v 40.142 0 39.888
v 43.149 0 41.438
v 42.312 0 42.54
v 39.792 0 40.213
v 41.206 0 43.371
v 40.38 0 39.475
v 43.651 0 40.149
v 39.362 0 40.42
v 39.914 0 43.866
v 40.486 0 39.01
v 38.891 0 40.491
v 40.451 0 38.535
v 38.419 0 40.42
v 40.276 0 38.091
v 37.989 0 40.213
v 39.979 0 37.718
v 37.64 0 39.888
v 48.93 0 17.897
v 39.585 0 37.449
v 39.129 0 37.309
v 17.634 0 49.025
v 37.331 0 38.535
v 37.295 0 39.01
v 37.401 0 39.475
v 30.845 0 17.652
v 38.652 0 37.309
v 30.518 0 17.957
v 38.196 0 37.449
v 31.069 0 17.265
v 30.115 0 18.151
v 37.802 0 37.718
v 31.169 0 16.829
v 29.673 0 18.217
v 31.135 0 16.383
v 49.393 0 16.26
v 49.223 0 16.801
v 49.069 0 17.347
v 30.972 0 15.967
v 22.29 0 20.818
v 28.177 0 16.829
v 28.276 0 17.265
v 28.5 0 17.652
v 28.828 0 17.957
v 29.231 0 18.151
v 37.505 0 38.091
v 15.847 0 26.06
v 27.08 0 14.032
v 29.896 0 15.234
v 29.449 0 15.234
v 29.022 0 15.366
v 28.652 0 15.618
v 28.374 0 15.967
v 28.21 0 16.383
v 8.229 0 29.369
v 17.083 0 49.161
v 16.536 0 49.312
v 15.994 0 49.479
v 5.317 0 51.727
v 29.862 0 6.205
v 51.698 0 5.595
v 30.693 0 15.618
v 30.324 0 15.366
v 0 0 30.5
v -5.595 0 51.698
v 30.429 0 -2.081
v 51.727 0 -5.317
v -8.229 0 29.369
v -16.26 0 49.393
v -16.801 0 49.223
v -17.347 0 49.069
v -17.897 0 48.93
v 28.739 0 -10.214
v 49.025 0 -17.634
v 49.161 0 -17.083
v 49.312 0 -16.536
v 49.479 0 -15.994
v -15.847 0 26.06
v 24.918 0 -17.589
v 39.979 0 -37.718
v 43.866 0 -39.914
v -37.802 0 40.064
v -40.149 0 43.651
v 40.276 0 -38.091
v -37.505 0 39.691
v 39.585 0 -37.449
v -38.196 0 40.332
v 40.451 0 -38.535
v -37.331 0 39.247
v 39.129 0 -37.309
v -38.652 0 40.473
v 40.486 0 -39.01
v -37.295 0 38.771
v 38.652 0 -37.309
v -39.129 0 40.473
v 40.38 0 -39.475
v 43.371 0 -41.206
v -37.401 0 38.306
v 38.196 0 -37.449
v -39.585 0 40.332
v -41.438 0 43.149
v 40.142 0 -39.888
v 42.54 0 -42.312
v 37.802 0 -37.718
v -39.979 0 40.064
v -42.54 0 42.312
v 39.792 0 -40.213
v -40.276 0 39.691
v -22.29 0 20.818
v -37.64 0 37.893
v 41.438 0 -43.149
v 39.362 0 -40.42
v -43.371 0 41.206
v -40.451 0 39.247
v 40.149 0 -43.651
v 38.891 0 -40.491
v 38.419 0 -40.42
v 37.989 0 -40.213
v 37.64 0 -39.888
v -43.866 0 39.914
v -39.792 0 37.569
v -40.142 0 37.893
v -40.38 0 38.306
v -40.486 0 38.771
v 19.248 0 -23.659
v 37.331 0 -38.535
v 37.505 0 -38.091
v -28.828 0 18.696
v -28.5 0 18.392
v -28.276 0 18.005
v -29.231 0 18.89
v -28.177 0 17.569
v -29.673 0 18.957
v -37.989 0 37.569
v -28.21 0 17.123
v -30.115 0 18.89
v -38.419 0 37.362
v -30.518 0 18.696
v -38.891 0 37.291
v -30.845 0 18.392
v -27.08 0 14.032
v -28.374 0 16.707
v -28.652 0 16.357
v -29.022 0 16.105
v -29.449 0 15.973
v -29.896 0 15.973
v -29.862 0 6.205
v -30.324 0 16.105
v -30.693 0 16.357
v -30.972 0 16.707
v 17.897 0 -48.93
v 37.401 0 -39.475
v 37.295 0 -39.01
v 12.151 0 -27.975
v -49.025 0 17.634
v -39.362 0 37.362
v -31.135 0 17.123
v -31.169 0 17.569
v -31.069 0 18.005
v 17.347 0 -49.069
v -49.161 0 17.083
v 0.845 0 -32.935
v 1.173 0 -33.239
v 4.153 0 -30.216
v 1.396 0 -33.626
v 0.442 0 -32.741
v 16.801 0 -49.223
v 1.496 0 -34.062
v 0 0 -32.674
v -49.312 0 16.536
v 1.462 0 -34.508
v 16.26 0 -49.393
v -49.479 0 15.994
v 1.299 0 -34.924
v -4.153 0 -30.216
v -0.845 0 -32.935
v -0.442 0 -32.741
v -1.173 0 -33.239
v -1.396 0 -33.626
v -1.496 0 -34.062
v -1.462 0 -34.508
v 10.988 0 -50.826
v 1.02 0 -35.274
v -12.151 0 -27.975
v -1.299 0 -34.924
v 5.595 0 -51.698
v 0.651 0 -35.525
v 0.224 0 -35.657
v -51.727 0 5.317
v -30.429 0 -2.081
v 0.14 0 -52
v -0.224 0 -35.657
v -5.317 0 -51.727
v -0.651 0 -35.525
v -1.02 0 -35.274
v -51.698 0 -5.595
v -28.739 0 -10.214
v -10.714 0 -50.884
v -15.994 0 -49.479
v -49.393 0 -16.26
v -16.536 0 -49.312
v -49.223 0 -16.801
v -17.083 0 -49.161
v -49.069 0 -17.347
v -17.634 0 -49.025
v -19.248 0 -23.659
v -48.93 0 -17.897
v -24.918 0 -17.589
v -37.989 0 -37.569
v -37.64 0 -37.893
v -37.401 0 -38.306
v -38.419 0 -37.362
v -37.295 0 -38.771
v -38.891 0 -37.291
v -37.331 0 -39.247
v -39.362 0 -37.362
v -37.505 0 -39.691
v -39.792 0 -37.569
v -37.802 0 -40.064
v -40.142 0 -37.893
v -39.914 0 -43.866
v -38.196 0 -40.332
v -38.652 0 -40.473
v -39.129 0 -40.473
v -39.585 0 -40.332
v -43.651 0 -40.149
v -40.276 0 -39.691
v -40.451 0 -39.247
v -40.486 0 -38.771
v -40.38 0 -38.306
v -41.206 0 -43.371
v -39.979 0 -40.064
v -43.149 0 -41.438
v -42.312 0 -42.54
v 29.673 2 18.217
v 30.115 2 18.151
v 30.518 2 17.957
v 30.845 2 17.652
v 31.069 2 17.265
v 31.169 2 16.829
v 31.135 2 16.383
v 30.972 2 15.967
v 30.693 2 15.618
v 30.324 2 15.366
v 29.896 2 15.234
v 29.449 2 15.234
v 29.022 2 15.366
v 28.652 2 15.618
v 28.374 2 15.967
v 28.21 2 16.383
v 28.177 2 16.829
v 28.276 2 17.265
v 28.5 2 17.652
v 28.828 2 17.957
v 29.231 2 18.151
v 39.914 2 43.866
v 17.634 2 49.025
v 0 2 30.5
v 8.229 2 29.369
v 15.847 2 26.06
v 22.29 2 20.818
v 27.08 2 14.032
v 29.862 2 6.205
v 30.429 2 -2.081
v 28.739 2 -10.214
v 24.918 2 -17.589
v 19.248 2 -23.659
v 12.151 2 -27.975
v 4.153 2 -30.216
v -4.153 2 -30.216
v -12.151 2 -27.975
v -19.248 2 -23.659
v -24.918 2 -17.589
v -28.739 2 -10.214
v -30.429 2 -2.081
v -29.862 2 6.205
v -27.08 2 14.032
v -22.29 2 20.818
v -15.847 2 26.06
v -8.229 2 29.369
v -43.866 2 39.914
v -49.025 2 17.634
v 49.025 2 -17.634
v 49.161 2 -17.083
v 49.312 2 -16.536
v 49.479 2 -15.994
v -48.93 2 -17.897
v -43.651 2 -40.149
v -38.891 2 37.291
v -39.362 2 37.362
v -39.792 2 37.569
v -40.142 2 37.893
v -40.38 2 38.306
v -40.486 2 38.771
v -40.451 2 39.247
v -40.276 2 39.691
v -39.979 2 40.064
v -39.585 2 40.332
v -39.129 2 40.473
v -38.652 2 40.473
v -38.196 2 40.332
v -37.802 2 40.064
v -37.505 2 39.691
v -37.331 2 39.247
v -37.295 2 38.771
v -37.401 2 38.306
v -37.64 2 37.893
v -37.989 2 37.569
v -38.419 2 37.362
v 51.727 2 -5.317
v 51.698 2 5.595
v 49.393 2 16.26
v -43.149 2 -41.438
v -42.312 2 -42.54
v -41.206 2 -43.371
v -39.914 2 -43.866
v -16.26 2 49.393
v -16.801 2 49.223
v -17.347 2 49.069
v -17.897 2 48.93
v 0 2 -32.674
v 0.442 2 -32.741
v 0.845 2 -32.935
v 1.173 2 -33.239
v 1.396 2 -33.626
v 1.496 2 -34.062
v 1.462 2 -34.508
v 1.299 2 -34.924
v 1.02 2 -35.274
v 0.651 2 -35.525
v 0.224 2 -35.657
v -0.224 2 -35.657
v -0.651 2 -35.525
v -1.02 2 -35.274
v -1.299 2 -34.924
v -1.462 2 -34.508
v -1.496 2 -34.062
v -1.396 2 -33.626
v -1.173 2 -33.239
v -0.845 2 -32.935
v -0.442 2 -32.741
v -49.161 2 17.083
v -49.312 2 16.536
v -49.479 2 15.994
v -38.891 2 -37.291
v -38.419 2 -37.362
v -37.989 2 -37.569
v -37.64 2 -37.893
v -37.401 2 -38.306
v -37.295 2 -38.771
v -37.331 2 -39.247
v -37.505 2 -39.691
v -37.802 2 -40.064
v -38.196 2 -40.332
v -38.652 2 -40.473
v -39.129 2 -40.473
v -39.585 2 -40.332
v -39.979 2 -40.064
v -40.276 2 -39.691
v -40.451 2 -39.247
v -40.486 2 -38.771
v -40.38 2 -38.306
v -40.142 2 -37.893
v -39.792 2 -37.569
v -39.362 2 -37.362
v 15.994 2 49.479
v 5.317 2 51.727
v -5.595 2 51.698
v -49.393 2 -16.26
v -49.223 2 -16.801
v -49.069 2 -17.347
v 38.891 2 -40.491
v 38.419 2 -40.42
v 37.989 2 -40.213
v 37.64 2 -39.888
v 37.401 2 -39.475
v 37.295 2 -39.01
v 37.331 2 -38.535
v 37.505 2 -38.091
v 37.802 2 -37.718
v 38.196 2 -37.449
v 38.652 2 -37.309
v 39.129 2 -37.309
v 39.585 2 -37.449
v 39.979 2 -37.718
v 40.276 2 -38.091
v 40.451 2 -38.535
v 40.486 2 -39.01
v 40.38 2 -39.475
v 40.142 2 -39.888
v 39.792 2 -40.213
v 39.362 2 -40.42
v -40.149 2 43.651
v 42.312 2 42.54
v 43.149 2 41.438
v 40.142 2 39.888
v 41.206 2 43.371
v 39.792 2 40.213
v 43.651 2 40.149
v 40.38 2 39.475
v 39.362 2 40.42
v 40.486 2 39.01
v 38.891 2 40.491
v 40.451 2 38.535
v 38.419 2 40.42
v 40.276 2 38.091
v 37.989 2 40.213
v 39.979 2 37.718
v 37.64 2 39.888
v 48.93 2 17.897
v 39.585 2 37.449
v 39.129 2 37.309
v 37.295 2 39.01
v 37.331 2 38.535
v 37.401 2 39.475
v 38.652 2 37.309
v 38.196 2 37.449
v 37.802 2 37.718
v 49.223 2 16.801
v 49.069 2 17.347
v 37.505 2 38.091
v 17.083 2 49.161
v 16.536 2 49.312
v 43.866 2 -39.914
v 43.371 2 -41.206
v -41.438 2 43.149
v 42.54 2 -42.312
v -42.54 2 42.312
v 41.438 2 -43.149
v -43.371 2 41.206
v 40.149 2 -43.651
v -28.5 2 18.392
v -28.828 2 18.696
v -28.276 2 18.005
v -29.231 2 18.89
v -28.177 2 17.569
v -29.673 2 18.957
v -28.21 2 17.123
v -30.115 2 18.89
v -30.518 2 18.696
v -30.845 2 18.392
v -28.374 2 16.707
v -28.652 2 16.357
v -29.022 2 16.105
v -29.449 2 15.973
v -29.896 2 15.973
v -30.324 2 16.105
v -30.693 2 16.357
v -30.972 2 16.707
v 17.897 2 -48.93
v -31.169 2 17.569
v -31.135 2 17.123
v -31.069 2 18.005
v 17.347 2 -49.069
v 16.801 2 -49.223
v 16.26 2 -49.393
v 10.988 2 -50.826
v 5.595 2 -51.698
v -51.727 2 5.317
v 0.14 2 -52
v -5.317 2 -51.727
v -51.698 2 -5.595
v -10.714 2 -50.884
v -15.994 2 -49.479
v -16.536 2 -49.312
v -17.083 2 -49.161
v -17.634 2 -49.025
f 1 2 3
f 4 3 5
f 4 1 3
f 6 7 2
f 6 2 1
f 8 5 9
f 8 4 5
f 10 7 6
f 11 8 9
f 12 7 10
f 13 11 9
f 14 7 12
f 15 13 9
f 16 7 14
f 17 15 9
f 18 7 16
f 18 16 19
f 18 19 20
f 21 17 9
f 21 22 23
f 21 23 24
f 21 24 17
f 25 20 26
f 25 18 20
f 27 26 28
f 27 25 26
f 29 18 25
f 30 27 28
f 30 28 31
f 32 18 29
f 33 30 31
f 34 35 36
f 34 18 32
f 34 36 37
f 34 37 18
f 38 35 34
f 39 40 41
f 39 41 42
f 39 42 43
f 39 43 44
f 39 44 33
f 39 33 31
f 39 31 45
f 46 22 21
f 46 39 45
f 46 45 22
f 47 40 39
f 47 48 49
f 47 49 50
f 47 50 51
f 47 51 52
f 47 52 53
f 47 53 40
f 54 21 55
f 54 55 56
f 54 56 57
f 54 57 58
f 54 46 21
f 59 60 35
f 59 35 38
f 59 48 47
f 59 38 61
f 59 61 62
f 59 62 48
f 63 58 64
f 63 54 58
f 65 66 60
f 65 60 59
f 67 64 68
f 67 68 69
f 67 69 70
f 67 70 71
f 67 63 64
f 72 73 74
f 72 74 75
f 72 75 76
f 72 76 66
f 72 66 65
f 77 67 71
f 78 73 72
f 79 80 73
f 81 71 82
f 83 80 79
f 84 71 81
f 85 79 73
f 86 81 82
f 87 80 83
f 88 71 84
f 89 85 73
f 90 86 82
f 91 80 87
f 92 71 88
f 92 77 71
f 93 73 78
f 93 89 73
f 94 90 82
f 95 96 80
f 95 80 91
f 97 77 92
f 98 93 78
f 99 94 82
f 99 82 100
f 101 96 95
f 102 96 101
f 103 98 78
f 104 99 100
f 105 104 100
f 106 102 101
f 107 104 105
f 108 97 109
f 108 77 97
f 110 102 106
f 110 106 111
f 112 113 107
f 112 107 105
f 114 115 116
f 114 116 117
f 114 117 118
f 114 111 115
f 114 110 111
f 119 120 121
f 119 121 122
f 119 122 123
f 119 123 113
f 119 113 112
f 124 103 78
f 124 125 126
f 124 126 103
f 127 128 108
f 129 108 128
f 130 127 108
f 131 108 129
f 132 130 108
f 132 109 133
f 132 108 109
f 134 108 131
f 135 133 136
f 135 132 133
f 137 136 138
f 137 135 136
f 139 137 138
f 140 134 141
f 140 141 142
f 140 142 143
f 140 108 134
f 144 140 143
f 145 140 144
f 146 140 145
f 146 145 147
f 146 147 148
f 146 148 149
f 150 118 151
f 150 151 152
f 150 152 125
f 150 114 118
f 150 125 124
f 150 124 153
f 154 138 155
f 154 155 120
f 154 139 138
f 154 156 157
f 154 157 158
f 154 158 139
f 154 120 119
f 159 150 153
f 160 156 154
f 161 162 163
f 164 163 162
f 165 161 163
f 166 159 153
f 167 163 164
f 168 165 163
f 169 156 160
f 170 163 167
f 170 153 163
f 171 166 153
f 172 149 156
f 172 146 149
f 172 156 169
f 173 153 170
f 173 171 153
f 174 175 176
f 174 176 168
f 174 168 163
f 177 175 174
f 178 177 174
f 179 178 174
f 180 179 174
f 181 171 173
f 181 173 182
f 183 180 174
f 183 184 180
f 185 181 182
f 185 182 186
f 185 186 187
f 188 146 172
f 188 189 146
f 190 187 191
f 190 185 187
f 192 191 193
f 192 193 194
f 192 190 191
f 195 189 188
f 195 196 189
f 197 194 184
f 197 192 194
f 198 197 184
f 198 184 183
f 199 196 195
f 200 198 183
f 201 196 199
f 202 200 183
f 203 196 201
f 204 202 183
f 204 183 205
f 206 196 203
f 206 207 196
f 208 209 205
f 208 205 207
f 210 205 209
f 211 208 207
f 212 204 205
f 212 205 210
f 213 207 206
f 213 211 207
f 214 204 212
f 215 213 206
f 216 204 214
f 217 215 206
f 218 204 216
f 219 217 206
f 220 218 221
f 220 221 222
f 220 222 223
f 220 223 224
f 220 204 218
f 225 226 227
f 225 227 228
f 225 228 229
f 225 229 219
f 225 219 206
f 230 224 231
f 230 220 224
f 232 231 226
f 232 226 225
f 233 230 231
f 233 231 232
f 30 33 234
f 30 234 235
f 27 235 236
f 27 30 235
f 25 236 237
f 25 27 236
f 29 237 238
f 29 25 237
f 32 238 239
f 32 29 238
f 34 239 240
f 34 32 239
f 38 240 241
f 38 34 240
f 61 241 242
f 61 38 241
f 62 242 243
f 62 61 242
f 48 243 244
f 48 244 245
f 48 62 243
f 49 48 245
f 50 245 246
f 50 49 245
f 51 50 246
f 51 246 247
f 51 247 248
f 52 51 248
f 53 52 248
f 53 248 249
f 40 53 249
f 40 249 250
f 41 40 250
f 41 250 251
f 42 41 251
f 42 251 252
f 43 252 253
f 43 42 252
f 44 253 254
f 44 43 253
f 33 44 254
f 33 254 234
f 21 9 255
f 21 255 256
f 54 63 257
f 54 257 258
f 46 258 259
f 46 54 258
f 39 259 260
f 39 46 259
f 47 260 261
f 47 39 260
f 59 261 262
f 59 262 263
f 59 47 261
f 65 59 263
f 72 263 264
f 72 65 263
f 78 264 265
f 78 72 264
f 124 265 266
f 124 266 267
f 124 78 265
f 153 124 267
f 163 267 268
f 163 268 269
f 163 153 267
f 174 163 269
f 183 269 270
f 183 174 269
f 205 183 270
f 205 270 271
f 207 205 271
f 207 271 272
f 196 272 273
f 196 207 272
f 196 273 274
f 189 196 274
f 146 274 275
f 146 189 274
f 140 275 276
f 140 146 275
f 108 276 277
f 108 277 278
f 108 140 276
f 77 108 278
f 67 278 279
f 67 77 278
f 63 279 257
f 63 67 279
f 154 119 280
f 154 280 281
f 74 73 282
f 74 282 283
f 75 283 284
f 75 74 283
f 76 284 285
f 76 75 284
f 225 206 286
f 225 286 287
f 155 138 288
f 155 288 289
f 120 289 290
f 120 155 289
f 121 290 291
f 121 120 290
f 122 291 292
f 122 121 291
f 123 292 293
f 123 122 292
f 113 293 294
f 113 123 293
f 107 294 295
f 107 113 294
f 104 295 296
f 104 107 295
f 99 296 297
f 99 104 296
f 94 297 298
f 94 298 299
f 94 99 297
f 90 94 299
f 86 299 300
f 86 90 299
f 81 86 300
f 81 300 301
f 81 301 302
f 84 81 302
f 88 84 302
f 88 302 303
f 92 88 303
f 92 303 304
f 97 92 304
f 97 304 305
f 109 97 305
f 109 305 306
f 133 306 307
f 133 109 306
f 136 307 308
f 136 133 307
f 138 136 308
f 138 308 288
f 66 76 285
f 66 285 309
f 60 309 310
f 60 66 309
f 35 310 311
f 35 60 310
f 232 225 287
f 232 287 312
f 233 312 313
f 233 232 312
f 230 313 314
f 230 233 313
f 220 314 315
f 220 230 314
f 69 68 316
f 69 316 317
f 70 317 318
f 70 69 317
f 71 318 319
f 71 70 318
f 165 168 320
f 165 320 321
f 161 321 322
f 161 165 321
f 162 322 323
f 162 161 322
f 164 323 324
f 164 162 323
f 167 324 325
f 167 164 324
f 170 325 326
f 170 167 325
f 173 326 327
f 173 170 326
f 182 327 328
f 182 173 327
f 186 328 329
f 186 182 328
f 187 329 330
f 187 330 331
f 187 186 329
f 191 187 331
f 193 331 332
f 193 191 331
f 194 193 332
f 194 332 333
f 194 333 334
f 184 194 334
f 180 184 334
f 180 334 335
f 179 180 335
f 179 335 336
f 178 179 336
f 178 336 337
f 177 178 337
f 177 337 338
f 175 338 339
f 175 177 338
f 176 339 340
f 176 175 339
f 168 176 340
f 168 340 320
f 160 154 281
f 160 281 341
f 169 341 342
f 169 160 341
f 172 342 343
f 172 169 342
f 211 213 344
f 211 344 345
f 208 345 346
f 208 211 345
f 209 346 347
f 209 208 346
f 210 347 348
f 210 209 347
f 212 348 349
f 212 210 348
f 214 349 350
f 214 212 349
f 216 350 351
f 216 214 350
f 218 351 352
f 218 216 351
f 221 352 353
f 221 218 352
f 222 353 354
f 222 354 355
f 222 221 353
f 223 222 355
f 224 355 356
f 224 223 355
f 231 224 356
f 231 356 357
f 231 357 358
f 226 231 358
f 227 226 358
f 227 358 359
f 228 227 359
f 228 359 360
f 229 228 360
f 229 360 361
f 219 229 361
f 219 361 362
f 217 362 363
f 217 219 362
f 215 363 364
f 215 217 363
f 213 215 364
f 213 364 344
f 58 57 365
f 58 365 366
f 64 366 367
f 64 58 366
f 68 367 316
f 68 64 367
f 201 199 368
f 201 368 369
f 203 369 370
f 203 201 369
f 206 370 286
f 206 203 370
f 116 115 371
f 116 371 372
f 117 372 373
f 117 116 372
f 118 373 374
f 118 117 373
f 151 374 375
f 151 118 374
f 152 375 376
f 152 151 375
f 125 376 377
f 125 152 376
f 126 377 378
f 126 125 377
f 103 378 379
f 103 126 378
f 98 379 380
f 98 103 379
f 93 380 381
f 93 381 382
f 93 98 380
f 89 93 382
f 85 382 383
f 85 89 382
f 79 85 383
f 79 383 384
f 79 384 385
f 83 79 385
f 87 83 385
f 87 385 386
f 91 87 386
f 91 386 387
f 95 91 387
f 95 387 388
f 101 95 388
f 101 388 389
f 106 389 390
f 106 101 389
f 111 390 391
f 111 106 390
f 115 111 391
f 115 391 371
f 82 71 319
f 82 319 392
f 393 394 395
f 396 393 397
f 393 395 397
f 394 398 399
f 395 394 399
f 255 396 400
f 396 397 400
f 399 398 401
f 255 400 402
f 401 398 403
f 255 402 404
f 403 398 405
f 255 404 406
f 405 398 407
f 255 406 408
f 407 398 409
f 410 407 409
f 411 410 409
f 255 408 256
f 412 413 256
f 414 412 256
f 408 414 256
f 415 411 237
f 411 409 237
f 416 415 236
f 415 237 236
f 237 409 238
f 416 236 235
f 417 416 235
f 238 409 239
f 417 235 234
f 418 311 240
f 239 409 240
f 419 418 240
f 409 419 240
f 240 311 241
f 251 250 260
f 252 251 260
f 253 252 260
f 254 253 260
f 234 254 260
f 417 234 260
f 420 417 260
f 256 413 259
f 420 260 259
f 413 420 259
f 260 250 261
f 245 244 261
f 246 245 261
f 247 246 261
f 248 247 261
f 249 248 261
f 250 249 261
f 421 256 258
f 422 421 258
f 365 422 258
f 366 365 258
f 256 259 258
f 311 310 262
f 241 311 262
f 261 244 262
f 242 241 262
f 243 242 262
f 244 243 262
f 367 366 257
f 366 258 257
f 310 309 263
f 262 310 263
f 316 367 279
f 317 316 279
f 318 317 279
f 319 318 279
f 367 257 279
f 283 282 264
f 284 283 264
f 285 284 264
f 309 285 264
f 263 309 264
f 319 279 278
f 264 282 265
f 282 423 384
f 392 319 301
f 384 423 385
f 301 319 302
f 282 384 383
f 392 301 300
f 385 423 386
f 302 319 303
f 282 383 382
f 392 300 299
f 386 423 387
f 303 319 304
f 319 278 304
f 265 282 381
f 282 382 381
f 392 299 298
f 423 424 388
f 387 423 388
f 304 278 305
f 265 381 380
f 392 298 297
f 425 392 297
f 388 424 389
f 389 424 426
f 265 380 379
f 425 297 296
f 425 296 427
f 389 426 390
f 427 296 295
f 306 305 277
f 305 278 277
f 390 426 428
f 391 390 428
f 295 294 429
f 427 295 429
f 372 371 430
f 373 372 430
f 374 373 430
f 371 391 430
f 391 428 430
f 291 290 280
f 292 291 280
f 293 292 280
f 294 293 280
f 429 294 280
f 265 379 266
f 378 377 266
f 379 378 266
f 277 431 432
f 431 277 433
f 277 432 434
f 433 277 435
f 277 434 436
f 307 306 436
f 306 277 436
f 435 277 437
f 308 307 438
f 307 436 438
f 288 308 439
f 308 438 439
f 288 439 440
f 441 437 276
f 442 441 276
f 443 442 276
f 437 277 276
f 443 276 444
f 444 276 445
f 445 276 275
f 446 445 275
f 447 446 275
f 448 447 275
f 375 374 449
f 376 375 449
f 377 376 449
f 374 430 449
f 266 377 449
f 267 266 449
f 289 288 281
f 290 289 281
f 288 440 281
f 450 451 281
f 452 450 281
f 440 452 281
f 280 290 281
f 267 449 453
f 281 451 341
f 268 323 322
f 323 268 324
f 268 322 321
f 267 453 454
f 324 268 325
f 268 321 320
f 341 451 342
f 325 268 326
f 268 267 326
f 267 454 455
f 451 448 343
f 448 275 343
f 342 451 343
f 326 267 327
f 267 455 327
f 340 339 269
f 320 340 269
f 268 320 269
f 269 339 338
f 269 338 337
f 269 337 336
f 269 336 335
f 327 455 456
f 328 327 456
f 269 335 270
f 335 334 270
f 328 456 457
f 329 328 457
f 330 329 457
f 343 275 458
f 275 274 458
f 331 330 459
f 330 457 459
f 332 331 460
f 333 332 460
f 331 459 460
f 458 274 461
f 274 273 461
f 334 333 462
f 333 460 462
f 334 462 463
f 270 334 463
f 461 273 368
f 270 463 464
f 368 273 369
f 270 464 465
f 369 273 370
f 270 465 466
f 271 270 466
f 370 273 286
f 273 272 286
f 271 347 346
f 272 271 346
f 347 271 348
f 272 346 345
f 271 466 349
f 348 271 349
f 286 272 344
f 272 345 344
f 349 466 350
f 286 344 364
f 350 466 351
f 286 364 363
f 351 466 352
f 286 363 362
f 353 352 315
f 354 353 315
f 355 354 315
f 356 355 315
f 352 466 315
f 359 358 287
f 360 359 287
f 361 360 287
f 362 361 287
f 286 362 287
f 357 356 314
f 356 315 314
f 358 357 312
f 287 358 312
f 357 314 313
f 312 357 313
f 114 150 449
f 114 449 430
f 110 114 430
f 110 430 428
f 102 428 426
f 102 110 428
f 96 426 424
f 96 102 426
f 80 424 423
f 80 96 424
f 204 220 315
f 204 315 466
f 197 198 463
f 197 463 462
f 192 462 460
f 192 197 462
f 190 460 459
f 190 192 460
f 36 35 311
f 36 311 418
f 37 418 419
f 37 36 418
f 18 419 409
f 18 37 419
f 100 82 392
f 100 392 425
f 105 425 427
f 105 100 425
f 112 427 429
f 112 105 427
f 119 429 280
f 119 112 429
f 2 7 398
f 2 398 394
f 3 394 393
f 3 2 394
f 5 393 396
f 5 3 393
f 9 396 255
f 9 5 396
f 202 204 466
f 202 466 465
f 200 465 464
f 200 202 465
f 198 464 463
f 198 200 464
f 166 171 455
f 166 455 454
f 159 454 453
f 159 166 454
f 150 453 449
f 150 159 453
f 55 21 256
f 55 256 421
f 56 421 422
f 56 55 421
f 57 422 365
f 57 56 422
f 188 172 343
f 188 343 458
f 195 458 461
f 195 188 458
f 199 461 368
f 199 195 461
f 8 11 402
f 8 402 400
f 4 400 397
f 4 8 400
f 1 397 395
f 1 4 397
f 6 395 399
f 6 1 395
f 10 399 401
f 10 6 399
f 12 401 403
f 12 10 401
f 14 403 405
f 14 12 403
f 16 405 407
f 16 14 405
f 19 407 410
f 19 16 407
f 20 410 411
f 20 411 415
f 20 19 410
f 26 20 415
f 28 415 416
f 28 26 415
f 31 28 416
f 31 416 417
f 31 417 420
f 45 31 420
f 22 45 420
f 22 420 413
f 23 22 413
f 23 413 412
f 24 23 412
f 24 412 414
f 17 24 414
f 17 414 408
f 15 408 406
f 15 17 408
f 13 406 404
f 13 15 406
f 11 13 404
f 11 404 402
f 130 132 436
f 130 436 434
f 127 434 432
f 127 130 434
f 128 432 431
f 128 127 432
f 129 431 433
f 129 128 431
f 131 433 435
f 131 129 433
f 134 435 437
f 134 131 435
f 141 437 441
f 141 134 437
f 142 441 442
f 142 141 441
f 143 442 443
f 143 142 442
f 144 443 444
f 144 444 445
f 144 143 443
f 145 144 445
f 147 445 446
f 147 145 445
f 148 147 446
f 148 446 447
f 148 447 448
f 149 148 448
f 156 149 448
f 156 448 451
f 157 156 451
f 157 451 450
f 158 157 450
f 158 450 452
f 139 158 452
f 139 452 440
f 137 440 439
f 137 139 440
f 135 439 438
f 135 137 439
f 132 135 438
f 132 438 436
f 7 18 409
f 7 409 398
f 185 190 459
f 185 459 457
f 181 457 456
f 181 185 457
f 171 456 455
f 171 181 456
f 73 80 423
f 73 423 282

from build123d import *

# Parameters (mm, degrees)
SKETCH1_R           = 1.6
SKETCH1_R_2         = 30.5
SKETCH1_R_3         = 1.5
BOSS_EXTRUDE1_DEPTH = 2


with BuildPart() as part:
    # Sketch1 → Boss-Extrude1 (new body)
    with BuildSketch(Plane(origin=(0, 0, 0), x_dir=(1, 0, 0), z_dir=(0, 1, 0))):
        with BuildLine():
            Line((17.897079586, 48.929734976), (40.149284407, 43.651218265))
            ThreePointArc((40.149284407, 43.651218265), (42.540265174, 42.312242187), (43.866371506, 39.91409958))
            Line((43.866371506, 39.91409958), (49.02521675, 17.633846579))
            ThreePointArc((49.02521675, 17.633846579), (49.23478351, 16.809026698), (49.479249782, 15.993868858))
            ThreePointArc((49.479249782, 15.993868858), (51.999812242, -0.139738387), (49.392575566, -16.259565766))
            ThreePointArc((49.392575566, -16.259565766), (49.143731732, -17.073397941), (48.929734976, -17.897079586))
            Line((48.929734976, -17.897079586), (43.651218265, -40.149284407))
            ThreePointArc((43.651218265, -40.149284407), (42.312242187, -42.540265174), (39.91409958, -43.866371506))
            Line((39.91409958, -43.866371506), (17.633846579, -49.02521675))
            ThreePointArc((17.633846579, -49.02521675), (16.809026698, -49.23478351), (15.993868858, -49.479249782))
            ThreePointArc((15.993868858, -49.479249782), (-0.139738387, -51.999812242), (-16.259565766, -49.392575566))
            ThreePointArc((-16.259565766, -49.392575566), (-17.073397941, -49.143731732), (-17.897079586, -48.929734976))
            Line((-17.897079586, -48.929734976), (-40.149284407, -43.651218265))
            ThreePointArc((-40.149284407, -43.651218265), (-42.540265174, -42.312242187), (-43.866371506, -39.91409958))
            Line((-43.866371506, -39.91409958), (-49.02521675, -17.633846579))
            ThreePointArc((-49.02521675, -17.633846579), (-49.23478351, -16.809026698), (-49.479249782, -15.993868858))
            ThreePointArc((-49.479249782, -15.993868858), (-51.999812242, 0.139738387), (-49.392575566, 16.259565766))
            ThreePointArc((-49.392575566, 16.259565766), (-49.143731732, 17.073397941), (-48.929734976, 17.897079586))
            Line((-48.929734976, 17.897079586), (-43.651218265, 40.149284407))
            ThreePointArc((-43.651218265, 40.149284407), (-42.312242187, 42.540265174), (-39.91409958, 43.866371506))
            Line((-39.91409958, 43.866371506), (-17.633846579, 49.02521675))
            ThreePointArc((-17.633846579, 49.02521675), (-16.809026698, 49.23478351), (-15.993868858, 49.479249782))
            ThreePointArc((-15.993868858, 49.479249782), (-8.026622704, 51.3767781), (0.139738387, 51.999812242))
            ThreePointArc((0.139738387, 51.999812242), (8.302633013, 51.332896714), (16.259565766, 49.392575566))
            ThreePointArc((16.259565766, 49.392575566), (17.073397941, 49.143731732), (17.897079586, 48.929734976))
        make_face()
        with Locations(Location((-38.8907, 38.8907, 0), (0, 0, 270))):
            Circle(SKETCH1_R, mode=Mode.SUBTRACT)
        with Locations(Location((38.8907, 38.8907, 0), (0, 0, 90))):
            Circle(SKETCH1_R, mode=Mode.SUBTRACT)
        with Locations(Location((38.8907, -38.8907, 0), (0, 0, 270))):
            Circle(SKETCH1_R, mode=Mode.SUBTRACT)
        with Locations(Location((-38.8907, -38.8907, 0), (0, 0, 90))):
            Circle(SKETCH1_R, mode=Mode.SUBTRACT)
        with Locations(Location((0, 0, 0), (0, 0, 270))):
            Circle(SKETCH1_R_2, mode=Mode.SUBTRACT)
        with Locations(Location((0, 34.1739971, 0), (0, 0, 270))):
            Circle(SKETCH1_R_3, mode=Mode.SUBTRACT)
        with Locations(Location((-29.672696408, -17.456745562, 0), (0, 0, 270))):
            Circle(SKETCH1_R_3, mode=Mode.SUBTRACT)
        with Locations(Location((29.672696408, -16.717251537, 0), (0, 0, 270))):
            Circle(SKETCH1_R_3, mode=Mode.SUBTRACT)
    extrude(amount=BOSS_EXTRUDE1_DEPTH)


solid = part.part
